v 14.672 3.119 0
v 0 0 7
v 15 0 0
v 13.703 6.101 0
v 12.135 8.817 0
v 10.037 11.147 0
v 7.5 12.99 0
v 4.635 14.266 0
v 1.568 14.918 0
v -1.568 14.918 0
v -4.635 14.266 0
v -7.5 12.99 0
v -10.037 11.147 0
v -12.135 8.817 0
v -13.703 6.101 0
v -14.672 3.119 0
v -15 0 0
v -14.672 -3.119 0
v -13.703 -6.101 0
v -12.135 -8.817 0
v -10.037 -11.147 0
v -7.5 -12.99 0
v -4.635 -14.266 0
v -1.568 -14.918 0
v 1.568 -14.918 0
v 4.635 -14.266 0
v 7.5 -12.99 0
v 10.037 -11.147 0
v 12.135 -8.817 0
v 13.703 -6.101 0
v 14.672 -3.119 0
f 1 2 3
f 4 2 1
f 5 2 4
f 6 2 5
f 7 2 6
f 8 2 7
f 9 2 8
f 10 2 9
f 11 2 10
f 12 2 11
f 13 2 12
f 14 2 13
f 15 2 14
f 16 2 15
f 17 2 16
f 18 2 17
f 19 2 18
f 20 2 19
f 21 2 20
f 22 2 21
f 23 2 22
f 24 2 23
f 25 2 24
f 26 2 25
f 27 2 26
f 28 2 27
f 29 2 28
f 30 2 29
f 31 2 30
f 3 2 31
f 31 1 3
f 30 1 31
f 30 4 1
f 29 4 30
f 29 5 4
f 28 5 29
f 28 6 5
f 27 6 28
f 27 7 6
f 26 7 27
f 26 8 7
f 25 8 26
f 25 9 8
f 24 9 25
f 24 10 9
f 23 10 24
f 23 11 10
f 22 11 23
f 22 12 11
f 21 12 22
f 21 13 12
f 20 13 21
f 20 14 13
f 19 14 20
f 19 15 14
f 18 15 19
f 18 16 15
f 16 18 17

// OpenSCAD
// Generated by SolidPython 1.0.1 on 2020-07-29 00:39:25


cylinder(h = 7, r1 = 15, r2 = 0);
/***********************************************
*********      SolidPython code:      **********
************************************************
 
# import packages: SolidPython
from solid import *
from solid.utils import *
from itertools import chain, combinations


class Resize:

    def __init__(self, scad_file):
        self.scad_file = scad_file
        #self.scad_file = import_scad(scad_file)
        # cone/cylinder param:
        self.r1 = 0
        self.r2 = 0
        self.h = 0
        # rectangular prism param:
        self.w = 0
        self.l = 0
        # ellipse param:
        self.r = 0

    # import OpenScad code (file name corresponds to shape)


    # classify shape + parameters
    def assign(self, param1, param2, param3):
        if self.scad_file == 'cone.scad':
            self.r1 = param1
            self.r2 = param2
            self.h = param3
        elif self.scad_file == 'cylinder.scad':
            self.r1 = param1
            self.r2 = param2
            self.h = param3
        elif self.scad_file == 'rectangularPrism.scad':
            self.h = param1
            self.l = param2
            self.w = param3
        else:
            self.r = param1
            self.h = param2

    # resize parameters
    def iterate(self):
        x = range(3, 20, 2)
        i = 1
        if self.scad_file == 'cone.scad':
            tempList = list(combinations(x, 2))
            for temp in tempList:
                param1 = temp[0]
                param2 = temp[1]
                filepath = 'produced_scad_files/' + 'cone' + str(param1) + '_' + str(param2) + '_' + '.scad'
                scad_render_to_file(cylinder(h=param1, r1=param2, r2=0), filepath)

        elif self.scad_file == 'cylinder.scad':
            tempList = list(combinations(x, 3))
            for temp in tempList:
                param1 = temp[0]
                param2 = temp[1]
                filepath = 'produced_scad_files/' + 'cylinder' + str(param1) + '_' + str(param2) + '_' + '.scad'
                scad_render_to_file(cylinder(h=param1, r1=param2, r2=param2), filepath)

        elif self.scad_file == 'rectangularPrism.scad':
            tempList = list(combinations(x, 3))
            for temp in tempList:
                param1 = temp[0]
                param2 = temp[1]
                param3 = temp[2]
                filepath = 'produced_scad_files/' + 'rectangularPrism' + str(param1) + '_' + str(param2) + '_' + str(
                    param3) + '.scad'
                scad_render_to_file(cube(size=(param1, param2, param3)), filepath)

        elif self.scad_file == 'ellipse.scad':
            tempList = list(combinations(x, 4))
            for temp in tempList:
                param1 = temp[0]
                param2 = temp[1]
                param3 = temp[2]
                param4 = temp[3]
                filepath = 'produced_scad_files/' + 'ellipse' + str(param1) + '_' + str(param2) + '_' + str(param3) + '_' + str(param4) + '.scad'
                scad_render_to_file(scale([param1, param2, param3])(sphere(r=param4)), filepath)

    def render_to_scadfile(self):
        scad_render_to_file(scad, 'example.scad') 
 
************************************************/
